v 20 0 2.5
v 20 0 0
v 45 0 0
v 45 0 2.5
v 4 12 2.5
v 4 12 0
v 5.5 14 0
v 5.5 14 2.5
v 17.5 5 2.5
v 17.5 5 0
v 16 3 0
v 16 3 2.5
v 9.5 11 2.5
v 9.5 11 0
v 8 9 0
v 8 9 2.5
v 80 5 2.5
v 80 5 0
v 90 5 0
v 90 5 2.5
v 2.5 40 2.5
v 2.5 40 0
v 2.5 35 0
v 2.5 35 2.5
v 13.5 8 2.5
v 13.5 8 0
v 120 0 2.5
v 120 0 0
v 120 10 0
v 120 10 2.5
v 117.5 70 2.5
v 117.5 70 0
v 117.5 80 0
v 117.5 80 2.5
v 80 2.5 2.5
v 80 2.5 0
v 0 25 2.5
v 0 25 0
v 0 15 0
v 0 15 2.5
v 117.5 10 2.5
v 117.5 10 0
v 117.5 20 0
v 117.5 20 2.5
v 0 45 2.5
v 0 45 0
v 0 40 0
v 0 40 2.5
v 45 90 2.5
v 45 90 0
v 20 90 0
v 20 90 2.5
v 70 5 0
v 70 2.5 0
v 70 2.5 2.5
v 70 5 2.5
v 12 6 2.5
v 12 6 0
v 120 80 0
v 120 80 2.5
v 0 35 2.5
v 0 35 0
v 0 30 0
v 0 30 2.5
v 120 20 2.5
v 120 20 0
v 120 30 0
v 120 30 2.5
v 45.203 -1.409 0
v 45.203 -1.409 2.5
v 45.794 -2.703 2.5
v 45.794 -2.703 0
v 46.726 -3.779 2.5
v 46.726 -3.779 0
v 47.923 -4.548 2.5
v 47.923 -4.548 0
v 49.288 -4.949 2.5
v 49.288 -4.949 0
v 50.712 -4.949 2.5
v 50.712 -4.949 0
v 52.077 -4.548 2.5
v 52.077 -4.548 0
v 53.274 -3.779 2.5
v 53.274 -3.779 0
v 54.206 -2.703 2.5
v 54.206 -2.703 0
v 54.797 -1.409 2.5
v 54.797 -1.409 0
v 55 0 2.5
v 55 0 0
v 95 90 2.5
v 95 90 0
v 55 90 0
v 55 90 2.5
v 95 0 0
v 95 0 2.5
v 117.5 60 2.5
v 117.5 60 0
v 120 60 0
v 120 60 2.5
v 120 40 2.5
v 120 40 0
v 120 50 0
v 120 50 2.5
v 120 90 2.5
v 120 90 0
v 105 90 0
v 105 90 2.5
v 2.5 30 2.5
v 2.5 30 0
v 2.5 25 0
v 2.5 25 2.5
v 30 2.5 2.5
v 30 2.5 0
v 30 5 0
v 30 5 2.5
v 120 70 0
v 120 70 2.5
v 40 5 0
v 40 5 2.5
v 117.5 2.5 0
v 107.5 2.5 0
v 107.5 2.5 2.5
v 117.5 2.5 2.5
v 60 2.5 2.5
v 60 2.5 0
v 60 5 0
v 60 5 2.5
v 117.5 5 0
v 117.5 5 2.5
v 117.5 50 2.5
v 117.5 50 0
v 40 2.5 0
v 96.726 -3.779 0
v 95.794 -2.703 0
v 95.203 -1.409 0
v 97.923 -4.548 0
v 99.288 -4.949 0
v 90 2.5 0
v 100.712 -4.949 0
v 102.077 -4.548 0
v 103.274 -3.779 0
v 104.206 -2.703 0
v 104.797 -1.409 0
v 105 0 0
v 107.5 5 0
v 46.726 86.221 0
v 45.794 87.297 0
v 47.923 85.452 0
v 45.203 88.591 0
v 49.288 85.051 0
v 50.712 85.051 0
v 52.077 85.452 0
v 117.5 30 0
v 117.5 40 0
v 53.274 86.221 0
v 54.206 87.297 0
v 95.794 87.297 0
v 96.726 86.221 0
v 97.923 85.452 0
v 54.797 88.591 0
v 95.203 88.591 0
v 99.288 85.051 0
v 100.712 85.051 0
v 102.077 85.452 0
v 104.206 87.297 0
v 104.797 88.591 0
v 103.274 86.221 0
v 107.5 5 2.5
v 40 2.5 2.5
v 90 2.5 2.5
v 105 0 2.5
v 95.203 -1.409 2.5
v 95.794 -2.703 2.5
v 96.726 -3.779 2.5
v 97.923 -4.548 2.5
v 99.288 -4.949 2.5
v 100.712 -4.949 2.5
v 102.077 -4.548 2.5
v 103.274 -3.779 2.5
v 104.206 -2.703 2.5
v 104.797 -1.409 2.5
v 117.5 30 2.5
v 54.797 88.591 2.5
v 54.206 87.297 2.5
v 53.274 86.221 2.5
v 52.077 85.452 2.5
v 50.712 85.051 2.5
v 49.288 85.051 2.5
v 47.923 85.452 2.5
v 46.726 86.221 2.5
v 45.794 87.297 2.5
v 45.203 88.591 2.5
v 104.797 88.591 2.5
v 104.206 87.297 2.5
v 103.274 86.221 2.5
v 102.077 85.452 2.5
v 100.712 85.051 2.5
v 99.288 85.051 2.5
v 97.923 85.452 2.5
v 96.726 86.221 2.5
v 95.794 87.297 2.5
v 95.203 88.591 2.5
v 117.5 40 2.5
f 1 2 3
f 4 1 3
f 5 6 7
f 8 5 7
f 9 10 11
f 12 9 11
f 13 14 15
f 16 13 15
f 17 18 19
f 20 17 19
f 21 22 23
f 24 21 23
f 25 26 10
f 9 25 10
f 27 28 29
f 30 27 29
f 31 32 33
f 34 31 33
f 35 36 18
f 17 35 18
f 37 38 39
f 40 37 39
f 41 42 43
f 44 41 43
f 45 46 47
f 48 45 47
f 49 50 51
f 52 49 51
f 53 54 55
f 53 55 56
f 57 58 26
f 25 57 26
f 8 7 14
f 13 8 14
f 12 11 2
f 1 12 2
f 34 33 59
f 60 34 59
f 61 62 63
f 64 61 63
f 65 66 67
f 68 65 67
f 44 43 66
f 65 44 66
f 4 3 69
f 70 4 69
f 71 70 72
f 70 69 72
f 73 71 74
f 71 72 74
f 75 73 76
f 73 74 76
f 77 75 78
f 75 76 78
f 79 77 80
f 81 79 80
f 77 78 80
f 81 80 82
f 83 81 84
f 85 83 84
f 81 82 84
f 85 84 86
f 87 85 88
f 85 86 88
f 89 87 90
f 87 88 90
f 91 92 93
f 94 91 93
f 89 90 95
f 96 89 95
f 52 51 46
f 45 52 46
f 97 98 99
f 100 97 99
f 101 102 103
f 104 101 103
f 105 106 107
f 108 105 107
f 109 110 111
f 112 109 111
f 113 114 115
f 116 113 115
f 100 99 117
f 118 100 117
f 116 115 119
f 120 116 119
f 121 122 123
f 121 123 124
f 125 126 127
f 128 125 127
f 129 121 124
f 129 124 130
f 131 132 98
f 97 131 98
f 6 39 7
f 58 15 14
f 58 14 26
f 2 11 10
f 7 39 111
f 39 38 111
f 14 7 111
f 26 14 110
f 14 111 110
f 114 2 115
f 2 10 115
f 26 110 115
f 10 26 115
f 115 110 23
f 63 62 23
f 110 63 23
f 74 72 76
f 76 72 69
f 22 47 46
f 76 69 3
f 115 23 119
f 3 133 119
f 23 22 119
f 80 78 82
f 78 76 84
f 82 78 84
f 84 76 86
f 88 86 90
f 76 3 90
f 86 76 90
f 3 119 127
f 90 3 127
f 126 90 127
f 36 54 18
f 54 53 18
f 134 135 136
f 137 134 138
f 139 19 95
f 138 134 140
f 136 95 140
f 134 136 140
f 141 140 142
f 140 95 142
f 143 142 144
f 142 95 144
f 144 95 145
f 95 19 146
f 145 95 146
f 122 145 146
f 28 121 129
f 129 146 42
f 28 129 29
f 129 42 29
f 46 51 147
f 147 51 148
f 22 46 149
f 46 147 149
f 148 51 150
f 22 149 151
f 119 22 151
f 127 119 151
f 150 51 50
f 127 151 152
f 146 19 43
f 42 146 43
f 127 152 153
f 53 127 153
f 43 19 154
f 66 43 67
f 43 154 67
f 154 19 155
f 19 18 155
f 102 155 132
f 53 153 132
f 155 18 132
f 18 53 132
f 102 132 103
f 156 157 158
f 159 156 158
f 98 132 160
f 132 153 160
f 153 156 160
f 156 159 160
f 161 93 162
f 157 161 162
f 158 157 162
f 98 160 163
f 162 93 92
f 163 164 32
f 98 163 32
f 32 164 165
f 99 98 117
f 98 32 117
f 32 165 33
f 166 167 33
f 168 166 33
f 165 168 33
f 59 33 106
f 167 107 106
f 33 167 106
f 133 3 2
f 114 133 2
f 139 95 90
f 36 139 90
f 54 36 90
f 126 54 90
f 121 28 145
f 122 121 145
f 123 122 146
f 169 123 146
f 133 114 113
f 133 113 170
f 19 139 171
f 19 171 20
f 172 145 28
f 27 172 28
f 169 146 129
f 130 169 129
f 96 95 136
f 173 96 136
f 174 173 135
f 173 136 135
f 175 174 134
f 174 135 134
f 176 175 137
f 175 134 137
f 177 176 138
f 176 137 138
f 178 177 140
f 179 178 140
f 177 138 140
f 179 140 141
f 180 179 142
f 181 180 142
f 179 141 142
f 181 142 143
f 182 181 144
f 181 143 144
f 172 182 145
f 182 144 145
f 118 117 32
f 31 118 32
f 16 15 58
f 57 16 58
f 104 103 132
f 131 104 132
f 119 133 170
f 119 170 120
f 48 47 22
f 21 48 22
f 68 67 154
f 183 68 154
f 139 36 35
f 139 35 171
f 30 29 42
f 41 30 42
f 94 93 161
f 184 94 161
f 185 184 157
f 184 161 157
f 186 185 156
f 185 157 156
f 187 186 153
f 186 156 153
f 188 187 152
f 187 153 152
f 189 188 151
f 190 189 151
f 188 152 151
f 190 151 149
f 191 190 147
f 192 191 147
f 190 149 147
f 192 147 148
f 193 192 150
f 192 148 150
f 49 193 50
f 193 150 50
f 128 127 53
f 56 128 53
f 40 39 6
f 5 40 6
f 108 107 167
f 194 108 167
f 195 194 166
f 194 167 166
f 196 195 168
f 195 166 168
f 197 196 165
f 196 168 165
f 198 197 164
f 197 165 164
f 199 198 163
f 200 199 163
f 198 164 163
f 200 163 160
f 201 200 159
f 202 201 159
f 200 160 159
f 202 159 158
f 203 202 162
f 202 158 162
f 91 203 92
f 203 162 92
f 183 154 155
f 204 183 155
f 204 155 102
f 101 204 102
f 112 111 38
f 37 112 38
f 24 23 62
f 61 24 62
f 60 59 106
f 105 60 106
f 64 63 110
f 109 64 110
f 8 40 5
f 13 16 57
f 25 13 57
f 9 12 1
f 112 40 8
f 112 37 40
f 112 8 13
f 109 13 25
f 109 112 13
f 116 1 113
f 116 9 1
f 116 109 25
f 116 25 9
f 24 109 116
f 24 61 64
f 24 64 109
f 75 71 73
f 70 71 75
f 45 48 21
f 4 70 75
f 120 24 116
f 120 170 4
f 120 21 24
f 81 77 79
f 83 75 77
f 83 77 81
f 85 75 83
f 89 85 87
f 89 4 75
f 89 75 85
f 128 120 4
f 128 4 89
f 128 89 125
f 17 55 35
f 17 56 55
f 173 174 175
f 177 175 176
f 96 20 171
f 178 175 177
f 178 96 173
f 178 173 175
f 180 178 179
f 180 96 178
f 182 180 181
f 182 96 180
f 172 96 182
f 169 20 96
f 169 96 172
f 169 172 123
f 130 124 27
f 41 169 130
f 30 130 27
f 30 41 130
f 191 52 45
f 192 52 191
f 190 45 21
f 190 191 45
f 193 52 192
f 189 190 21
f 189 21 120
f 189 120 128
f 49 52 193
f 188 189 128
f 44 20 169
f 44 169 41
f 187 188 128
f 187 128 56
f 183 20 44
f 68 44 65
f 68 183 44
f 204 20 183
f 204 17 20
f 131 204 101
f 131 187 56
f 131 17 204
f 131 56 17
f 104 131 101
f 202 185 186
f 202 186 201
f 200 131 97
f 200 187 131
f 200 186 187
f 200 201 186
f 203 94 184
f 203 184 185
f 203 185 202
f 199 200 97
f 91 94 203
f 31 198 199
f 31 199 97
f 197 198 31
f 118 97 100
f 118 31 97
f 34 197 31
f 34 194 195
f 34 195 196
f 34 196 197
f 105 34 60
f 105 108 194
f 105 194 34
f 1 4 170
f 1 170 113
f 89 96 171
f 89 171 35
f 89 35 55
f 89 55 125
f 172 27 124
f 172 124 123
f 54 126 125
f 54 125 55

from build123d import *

# Parameters (mm, degrees)
SKETCH1_W           = 10
SKETCH1_H           = 2.5
BOSS_EXTRUDE1_DEPTH = 2.5


with BuildPart() as part:
    # Sketch1 → Boss-Extrude1 (new body)
    with BuildSketch(Plane.XY):
        with BuildLine():
            Line((20, 0), (45, 0))
            ThreePointArc((45, 0), (50, -5), (55, 0))
            Line((55, 0), (95, 0))
            ThreePointArc((95, 0), (100, -5), (105, 0))
            Line((105, 0), (120, 0))
            Line((120, 0), (120, 10))
            Line((120, 10), (117.5, 10))
            Line((117.5, 10), (117.5, 20))
            Line((117.5, 20), (120, 20))
            Line((120, 20), (120, 30))
            Line((120, 30), (117.5, 30))
            Line((117.5, 30), (117.5, 40))
            Line((117.5, 40), (120, 40))
            Line((120, 40), (120, 50))
            Line((120, 50), (117.5, 50))
            Line((117.5, 50), (117.5, 60))
            Line((117.5, 60), (120, 60))
            Line((120, 60), (120, 70))
            Line((120, 70), (117.5, 70))
            Line((117.5, 70), (117.5, 80))
            Line((117.5, 80), (120, 80))
            Line((120, 80), (120, 90))
            Line((120, 90), (105, 90))
            ThreePointArc((105, 90), (100, 85), (95, 90))
            Line((95, 90), (55, 90))
            ThreePointArc((55, 90), (50, 85), (45, 90))
            Line((45, 90), (20, 90))
            Line((20, 90), (0, 45))
            Line((0, 45), (0, 40))
            Line((0, 40), (2.5, 40))
            Line((2.5, 40), (2.5, 35))
            Line((2.5, 35), (0, 35))
            Line((0, 35), (0, 30))
            Line((0, 30), (2.5, 30))
            Line((2.5, 30), (2.5, 25))
            Line((2.5, 25), (0, 25))
            Line((0, 25), (0, 15))
            Line((0, 15), (4, 12))
            Line((4, 12), (5.5, 14))
            Line((5.5, 14), (9.5, 11))
            Line((9.5, 11), (8, 9))
            Line((8, 9), (12, 6))
            Line((12, 6), (13.5, 8))
            Line((13.5, 8), (17.5, 5))
            Line((17.5, 5), (16, 3))
            Line((16, 3), (20, 0))
        make_face()
        with Locations((112.5, 3.75)):
            Rectangle(SKETCH1_W, SKETCH1_H, mode=Mode.SUBTRACT)
        with Locations((85, 3.75)):
            Rectangle(SKETCH1_W, SKETCH1_H, mode=Mode.SUBTRACT)
        with Locations((65, 3.75)):
            Rectangle(SKETCH1_W, SKETCH1_H, mode=Mode.SUBTRACT)
        with Locations((35, 3.75)):
            Rectangle(SKETCH1_W, SKETCH1_H, mode=Mode.SUBTRACT)
    extrude(amount=BOSS_EXTRUDE1_DEPTH)


solid = part.part
